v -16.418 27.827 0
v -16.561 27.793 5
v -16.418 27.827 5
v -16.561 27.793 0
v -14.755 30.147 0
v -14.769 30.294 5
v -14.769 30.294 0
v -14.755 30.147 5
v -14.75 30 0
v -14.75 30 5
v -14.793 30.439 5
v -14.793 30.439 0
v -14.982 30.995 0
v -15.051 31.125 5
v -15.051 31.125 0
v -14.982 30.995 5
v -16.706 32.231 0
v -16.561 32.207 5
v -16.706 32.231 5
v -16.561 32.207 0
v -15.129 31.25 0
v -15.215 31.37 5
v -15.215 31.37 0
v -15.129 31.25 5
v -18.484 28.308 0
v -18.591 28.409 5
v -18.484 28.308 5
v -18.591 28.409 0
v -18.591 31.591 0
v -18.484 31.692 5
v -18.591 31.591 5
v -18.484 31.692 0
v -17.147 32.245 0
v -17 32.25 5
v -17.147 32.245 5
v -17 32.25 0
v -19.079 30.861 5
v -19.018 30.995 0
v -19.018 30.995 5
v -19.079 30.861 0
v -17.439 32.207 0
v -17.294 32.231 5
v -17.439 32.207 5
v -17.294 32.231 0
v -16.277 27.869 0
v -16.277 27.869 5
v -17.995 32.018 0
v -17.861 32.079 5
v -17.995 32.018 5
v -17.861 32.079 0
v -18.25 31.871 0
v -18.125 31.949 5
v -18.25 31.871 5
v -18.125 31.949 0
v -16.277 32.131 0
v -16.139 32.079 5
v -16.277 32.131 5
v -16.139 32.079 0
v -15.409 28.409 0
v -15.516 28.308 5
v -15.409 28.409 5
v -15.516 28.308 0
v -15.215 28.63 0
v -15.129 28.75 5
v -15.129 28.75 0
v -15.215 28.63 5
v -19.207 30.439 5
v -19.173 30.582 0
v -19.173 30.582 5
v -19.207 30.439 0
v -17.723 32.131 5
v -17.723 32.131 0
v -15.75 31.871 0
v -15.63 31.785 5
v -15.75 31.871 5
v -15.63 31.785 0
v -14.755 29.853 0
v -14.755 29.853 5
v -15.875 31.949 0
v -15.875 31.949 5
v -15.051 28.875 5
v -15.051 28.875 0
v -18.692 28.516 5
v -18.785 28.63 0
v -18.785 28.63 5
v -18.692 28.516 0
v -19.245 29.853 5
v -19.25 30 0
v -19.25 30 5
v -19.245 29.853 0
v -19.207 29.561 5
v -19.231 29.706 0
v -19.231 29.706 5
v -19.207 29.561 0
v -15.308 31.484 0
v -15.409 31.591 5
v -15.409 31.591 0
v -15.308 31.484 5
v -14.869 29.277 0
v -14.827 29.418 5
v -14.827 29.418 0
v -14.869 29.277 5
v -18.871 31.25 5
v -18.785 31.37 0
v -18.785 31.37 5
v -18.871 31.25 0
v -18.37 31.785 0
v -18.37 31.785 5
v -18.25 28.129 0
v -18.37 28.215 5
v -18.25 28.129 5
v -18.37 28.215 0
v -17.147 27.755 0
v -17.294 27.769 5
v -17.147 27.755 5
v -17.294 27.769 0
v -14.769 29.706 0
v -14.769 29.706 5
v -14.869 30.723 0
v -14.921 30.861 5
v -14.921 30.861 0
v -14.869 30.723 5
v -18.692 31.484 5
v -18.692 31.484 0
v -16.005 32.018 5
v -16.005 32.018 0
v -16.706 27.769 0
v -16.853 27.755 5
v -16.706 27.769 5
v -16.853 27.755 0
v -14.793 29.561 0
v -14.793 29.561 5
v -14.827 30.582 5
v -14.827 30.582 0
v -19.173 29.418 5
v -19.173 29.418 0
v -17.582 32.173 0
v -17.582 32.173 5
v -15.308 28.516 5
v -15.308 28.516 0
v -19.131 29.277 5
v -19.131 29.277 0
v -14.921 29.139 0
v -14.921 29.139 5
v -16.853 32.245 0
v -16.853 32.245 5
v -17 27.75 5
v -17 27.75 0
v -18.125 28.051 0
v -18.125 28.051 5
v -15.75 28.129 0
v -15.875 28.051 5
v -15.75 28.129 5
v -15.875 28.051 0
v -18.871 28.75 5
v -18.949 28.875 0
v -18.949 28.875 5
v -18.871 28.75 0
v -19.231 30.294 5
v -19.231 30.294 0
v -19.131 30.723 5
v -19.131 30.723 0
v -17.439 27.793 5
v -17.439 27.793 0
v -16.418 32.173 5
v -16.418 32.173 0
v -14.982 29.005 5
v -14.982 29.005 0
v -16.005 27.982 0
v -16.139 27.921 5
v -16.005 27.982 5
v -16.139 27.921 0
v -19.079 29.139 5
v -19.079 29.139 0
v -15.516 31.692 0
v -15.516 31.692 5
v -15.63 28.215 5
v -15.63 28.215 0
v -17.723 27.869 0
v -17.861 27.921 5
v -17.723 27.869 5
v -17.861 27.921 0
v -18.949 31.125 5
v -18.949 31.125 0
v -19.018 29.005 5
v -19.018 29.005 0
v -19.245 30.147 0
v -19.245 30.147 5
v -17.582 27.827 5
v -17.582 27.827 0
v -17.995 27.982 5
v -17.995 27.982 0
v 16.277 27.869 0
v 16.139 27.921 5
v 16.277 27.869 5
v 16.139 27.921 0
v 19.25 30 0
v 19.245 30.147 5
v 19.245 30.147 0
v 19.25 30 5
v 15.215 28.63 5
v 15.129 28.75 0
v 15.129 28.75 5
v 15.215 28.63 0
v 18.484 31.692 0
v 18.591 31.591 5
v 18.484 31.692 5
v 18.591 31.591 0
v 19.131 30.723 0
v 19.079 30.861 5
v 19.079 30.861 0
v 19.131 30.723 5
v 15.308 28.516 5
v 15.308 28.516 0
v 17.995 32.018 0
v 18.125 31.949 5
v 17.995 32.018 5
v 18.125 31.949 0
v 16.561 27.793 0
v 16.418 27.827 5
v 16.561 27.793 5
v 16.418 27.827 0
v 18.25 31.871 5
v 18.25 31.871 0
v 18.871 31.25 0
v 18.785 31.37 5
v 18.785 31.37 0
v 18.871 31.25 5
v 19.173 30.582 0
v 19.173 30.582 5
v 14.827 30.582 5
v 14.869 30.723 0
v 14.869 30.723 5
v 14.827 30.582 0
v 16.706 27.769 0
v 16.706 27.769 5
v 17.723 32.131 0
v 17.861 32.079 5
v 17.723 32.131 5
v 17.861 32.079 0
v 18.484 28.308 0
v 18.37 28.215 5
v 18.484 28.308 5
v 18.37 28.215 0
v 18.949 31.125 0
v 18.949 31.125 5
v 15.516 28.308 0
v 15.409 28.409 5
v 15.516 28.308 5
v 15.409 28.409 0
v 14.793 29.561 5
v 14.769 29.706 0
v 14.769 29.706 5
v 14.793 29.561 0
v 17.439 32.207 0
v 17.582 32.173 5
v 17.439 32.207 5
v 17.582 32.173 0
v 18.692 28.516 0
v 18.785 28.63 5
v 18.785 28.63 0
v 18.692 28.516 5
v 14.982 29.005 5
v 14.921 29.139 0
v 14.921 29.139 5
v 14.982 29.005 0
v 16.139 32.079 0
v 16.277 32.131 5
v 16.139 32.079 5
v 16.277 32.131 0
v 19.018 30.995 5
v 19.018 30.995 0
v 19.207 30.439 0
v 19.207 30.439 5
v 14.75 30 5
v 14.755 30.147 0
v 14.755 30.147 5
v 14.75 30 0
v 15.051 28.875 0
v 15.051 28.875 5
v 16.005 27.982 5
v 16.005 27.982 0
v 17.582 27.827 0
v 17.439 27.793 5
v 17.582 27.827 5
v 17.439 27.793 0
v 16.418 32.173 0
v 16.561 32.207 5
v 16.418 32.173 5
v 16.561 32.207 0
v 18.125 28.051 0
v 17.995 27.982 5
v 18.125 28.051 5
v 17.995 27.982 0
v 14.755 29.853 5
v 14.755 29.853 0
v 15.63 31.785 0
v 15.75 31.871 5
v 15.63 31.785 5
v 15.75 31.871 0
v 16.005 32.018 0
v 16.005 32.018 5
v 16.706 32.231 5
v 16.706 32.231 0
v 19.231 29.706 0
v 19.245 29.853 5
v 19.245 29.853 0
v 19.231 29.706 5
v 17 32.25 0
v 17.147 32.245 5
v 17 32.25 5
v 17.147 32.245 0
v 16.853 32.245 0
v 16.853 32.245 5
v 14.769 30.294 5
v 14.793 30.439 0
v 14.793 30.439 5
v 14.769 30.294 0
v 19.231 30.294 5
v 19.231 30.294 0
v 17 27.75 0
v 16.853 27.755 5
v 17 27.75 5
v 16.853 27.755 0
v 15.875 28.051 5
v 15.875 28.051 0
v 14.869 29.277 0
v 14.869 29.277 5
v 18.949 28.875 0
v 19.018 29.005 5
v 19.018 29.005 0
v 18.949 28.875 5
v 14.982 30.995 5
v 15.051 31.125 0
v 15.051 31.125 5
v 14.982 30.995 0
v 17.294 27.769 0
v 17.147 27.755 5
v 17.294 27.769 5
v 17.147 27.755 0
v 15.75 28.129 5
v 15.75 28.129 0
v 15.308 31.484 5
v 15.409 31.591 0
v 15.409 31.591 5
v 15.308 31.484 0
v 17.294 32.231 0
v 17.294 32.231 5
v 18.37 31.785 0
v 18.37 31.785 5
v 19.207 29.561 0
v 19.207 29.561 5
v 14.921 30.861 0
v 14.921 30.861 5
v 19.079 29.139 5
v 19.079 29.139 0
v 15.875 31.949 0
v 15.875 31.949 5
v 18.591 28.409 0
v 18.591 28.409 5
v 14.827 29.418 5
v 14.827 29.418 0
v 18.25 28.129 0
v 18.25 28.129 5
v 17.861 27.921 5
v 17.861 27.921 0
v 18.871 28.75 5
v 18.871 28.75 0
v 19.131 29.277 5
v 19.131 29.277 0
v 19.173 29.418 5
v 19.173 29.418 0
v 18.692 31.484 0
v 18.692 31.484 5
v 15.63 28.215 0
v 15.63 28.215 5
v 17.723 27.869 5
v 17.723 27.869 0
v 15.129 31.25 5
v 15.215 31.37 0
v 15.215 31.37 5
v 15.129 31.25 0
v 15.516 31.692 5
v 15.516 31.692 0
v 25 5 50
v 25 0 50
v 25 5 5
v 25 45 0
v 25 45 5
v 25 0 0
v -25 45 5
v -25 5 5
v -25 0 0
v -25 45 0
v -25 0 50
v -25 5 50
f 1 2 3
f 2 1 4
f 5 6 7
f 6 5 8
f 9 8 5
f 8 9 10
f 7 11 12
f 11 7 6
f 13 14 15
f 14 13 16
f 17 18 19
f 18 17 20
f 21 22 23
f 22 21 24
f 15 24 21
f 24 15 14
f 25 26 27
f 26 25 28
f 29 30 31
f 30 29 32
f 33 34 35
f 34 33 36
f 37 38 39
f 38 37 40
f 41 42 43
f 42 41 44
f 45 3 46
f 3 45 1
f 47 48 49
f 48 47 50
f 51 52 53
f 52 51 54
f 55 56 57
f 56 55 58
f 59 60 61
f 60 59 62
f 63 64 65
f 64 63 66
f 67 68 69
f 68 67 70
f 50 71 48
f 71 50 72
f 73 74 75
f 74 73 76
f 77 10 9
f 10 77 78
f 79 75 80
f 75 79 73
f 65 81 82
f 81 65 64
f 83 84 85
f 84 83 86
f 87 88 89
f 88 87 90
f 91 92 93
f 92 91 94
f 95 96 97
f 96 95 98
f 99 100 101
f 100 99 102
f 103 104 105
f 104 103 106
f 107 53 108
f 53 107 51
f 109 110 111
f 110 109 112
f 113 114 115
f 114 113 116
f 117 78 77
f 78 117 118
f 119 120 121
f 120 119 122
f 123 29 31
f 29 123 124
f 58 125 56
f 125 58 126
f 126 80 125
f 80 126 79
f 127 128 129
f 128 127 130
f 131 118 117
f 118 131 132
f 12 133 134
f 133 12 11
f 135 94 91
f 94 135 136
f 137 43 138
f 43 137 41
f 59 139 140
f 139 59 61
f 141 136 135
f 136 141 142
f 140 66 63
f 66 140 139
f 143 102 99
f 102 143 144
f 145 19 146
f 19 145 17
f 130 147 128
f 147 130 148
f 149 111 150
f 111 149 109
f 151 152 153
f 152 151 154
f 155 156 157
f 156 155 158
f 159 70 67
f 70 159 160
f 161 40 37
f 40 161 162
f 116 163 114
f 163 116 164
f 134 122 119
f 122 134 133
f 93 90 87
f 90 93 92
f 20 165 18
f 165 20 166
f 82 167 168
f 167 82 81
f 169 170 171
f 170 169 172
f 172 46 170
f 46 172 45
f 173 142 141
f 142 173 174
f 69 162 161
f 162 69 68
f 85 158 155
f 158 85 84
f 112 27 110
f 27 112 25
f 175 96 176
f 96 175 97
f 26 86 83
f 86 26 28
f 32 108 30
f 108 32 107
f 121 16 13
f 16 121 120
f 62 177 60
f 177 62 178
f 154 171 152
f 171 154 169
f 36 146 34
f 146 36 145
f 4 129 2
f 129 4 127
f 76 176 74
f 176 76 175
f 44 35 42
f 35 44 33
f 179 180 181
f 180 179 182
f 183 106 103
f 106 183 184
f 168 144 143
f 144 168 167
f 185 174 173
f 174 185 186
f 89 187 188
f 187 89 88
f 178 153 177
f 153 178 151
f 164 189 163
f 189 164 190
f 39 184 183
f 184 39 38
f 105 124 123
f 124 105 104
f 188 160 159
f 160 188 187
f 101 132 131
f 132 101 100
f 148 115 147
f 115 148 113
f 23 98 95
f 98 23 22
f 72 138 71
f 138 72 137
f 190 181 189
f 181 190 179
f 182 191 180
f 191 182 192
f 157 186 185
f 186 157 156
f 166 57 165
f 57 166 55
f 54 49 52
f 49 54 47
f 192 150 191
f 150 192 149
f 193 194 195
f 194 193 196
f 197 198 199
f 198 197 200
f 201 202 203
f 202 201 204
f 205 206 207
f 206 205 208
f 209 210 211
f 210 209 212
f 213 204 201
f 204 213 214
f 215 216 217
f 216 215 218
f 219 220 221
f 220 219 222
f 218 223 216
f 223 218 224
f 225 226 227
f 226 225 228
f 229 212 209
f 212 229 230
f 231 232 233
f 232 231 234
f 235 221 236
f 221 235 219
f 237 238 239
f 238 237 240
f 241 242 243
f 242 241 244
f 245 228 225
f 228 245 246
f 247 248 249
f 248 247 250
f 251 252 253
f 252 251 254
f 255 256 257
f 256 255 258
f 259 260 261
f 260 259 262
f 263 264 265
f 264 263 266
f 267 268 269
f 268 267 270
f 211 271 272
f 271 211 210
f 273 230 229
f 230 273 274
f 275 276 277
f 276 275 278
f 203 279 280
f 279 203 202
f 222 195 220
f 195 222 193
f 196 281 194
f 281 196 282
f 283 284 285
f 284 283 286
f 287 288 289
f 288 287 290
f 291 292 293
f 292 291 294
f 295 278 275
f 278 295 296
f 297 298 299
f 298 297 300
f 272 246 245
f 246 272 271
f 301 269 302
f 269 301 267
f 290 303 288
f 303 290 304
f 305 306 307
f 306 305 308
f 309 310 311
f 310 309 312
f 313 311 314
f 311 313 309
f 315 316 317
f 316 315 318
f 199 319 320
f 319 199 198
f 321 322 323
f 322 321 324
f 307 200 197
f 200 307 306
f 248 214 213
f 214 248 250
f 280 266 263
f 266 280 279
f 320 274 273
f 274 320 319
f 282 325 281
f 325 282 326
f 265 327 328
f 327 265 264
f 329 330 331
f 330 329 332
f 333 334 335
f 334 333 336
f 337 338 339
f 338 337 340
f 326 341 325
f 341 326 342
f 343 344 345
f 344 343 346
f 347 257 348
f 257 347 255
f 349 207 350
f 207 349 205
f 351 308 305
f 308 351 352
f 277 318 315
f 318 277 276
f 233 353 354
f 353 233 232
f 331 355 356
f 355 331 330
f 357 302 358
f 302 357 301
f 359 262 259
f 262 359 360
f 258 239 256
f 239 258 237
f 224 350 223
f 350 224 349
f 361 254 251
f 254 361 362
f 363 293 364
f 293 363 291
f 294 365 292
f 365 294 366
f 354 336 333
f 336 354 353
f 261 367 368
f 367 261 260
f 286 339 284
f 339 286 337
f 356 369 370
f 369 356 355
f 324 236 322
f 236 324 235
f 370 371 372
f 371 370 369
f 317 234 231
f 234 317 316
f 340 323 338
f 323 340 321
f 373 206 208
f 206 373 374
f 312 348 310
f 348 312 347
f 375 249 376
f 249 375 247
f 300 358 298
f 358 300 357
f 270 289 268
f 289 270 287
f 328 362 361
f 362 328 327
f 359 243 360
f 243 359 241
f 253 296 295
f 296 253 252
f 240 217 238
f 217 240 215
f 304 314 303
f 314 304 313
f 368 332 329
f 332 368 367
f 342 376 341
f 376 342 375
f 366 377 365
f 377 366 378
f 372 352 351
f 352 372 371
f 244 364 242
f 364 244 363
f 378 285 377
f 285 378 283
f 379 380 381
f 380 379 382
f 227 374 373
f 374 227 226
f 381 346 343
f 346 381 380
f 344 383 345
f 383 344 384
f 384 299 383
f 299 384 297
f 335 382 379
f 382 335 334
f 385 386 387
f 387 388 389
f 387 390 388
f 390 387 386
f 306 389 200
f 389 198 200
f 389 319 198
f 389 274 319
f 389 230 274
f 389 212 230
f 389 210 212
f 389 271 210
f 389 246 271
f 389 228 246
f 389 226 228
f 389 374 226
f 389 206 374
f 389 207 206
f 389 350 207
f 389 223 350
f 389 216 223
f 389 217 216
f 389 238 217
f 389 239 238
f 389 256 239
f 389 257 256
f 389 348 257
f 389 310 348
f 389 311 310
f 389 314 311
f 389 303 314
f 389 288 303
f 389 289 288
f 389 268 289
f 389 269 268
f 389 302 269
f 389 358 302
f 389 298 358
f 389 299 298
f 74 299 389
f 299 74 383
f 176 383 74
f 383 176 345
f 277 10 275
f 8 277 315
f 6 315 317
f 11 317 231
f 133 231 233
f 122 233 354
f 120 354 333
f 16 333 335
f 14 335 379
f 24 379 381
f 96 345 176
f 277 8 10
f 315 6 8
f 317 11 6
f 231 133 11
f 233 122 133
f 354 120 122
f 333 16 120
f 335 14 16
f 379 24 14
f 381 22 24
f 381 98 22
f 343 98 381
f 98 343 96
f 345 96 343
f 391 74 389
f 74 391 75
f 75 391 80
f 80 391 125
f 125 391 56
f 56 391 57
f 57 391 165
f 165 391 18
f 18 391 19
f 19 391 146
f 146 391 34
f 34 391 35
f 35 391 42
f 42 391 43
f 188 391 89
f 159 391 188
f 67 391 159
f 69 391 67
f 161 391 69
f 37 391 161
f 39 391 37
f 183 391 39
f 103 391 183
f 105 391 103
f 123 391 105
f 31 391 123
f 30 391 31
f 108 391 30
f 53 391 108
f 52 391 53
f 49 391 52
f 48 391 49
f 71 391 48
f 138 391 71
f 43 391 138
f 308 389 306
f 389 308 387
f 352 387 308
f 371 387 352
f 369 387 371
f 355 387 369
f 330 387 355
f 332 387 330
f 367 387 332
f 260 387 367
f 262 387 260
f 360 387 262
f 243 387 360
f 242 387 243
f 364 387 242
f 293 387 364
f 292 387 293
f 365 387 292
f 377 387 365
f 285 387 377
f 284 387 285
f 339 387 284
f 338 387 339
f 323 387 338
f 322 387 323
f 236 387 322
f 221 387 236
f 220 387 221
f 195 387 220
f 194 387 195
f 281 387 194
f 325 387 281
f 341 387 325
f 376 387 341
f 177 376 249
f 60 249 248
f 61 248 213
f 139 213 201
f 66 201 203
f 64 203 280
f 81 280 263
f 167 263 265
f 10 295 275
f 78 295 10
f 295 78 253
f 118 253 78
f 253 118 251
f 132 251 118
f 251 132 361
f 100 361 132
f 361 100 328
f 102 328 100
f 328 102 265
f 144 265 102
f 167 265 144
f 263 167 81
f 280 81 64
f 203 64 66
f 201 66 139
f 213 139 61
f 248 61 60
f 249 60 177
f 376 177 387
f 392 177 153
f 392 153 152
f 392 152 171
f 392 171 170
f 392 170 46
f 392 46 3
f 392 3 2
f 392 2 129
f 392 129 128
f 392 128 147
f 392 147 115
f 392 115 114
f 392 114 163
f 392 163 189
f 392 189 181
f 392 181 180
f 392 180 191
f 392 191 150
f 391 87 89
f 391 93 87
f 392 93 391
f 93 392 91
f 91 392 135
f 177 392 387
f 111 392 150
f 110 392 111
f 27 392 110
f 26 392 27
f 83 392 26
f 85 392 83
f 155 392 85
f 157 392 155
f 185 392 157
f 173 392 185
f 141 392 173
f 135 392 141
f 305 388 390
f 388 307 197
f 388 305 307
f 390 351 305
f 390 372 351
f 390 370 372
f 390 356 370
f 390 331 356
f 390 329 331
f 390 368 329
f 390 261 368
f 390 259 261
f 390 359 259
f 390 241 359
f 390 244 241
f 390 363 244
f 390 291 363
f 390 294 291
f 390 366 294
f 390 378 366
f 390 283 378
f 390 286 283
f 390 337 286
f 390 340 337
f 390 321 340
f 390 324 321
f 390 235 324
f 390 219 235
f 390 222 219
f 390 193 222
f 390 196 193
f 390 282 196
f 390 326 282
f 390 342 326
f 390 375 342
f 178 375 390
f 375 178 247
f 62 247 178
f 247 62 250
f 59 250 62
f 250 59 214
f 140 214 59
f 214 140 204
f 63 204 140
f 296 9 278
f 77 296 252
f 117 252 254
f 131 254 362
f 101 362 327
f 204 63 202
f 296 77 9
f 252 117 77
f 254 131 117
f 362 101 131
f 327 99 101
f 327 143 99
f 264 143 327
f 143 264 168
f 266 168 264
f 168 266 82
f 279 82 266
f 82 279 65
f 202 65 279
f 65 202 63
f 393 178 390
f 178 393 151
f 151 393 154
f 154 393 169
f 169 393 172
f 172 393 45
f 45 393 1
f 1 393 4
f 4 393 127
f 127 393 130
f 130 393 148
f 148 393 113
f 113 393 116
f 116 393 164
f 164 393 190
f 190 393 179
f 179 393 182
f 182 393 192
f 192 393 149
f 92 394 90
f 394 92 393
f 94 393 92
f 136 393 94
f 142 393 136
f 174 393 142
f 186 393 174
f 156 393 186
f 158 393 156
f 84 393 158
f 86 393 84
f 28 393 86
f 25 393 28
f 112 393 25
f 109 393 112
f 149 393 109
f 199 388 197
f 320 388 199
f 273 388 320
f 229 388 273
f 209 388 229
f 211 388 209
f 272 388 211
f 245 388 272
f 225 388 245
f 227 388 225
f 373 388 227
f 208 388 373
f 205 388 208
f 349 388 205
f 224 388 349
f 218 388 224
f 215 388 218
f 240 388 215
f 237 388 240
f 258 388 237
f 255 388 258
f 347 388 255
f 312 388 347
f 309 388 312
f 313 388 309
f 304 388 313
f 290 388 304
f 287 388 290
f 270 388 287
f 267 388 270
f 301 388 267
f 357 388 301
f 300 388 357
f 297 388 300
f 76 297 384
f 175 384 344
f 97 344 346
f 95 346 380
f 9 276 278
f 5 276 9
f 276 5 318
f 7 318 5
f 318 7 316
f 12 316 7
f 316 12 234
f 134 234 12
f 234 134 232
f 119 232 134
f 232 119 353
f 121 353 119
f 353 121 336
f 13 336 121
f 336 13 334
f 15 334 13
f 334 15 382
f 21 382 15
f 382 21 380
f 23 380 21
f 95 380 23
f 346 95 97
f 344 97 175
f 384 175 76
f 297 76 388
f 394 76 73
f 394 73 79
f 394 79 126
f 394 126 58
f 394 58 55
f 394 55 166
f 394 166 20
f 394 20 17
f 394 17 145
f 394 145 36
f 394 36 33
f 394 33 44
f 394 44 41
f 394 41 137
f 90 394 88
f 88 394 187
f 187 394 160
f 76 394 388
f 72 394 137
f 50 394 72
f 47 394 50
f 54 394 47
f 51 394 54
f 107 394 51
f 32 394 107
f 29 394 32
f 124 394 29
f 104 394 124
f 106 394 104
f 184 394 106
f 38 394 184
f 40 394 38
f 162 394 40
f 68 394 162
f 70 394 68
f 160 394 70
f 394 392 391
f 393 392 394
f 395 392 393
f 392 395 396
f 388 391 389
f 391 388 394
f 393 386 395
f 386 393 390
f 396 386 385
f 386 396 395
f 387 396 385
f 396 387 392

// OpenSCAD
// L-shaped mounting bracket for NEMA 17 stepper motor (e.g. syringe pump)
// Print orientation: base plate on bed (z = 0), vertical plate builds upward.

// ---------------- Parameters ----------------
base_x0      = -25;   // base plate X start
base_x1      = 25;    // base plate X end
base_y0      = 0;     // base plate Y start
base_y1      = 45;    // base plate Y end
base_z0      = 0;     // base plate Z start
base_z1      = 5;     // base plate Z end

hole_x       = -17;   // M4 hole X position (first hole)
hole_y       = 30;    // M4 hole Y position (first hole)
hole_d       = 4.5;   // M4 hole diameter

motor_x0     = -25;   // motor plate X start
motor_x1     = 25;    // motor plate X end
motor_y0     = 0;     // motor plate Y start
motor_y1     = 5;     // motor plate Y end
motor_z0     = 0;     // motor plate Z start
motor_z1     = 50;    // motor plate Z end

boss_d       = 23;    // motor boss hole diameter
boss_x       = 0;     // boss hole X centre
boss_z       = 28;    // boss hole Z centre

screw_d      = 3.4;   // M3 screw hole diameter
screw_n      = 4;     // number of screw holes
screw_a      = 31;    // screw pattern size (square side)

gusset_t     = 5;     // gusset thickness (X)
gusset_leg   = 20;    // gusset leg length (Y and Z)
gusset_x0    = -25;   // left gusset X start
gusset_x1    = 20;    // right gusset X start

eps          = 0.5;   // cutter overshoot past faces

$fn = 96;

// ---------------- Model ----------------
union() {
    // Base plate with M4 through-holes
    difference() {
        translate([base_x0, base_y0, base_z0])
            cube([base_x1 - base_x0, base_y1 - base_y0, base_z1 - base_z0]);

        for (h = [hole_x, hole_x + 34]) {
            translate([h, hole_y, -eps])
                cylinder(d = hole_d, h = base_z1 - base_z0 + 2 * eps);
        }
    }

    // Vertical motor plate with boss hole and M3 screw holes
    difference() {
        translate([motor_x0, motor_y0, motor_z0])
            cube([motor_x1 - motor_x0, motor_y1 - motor_y0, motor_z1 - motor_z0]);

        // Boss hole along Y
        translate([boss_x, -eps, boss_z])
            rotate([90, 0, 0])
                cylinder(d = boss_d, h = motor_y1 - motor_y0 + 2 * eps);

        // Screw holes on square pattern
        for (i = [0 : screw_n - 1]) {
            a = screw_a + screw_d;
            r = a / 2;
            translate([0, 0, motor_z0])
                rotate([0, 90, 0])
                    translate([0, r, 0])
                        cylinder(d = screw_d, h = motor_z1 - motor_z0 + eps);
        }
    }

    // Left gusset (right triangle in YZ plane)
    translate([gusset_x0, 5, 5])
        rotate([90, 0, 0])
            linear_extrude(height = gusset_t)
                polygon([0, 0, gusset_leg, 0, gusset_leg, gusset_leg]);

    // Right gusset (right triangle in YZ plane)
    translate([gusset_x1, 5, 5])
        rotate([90, 0, 0])
            linear_extrude(height = gusset_t)
                polygon([0, 0, gusset_leg, 0, gusset_leg, gusset_leg]);
}
